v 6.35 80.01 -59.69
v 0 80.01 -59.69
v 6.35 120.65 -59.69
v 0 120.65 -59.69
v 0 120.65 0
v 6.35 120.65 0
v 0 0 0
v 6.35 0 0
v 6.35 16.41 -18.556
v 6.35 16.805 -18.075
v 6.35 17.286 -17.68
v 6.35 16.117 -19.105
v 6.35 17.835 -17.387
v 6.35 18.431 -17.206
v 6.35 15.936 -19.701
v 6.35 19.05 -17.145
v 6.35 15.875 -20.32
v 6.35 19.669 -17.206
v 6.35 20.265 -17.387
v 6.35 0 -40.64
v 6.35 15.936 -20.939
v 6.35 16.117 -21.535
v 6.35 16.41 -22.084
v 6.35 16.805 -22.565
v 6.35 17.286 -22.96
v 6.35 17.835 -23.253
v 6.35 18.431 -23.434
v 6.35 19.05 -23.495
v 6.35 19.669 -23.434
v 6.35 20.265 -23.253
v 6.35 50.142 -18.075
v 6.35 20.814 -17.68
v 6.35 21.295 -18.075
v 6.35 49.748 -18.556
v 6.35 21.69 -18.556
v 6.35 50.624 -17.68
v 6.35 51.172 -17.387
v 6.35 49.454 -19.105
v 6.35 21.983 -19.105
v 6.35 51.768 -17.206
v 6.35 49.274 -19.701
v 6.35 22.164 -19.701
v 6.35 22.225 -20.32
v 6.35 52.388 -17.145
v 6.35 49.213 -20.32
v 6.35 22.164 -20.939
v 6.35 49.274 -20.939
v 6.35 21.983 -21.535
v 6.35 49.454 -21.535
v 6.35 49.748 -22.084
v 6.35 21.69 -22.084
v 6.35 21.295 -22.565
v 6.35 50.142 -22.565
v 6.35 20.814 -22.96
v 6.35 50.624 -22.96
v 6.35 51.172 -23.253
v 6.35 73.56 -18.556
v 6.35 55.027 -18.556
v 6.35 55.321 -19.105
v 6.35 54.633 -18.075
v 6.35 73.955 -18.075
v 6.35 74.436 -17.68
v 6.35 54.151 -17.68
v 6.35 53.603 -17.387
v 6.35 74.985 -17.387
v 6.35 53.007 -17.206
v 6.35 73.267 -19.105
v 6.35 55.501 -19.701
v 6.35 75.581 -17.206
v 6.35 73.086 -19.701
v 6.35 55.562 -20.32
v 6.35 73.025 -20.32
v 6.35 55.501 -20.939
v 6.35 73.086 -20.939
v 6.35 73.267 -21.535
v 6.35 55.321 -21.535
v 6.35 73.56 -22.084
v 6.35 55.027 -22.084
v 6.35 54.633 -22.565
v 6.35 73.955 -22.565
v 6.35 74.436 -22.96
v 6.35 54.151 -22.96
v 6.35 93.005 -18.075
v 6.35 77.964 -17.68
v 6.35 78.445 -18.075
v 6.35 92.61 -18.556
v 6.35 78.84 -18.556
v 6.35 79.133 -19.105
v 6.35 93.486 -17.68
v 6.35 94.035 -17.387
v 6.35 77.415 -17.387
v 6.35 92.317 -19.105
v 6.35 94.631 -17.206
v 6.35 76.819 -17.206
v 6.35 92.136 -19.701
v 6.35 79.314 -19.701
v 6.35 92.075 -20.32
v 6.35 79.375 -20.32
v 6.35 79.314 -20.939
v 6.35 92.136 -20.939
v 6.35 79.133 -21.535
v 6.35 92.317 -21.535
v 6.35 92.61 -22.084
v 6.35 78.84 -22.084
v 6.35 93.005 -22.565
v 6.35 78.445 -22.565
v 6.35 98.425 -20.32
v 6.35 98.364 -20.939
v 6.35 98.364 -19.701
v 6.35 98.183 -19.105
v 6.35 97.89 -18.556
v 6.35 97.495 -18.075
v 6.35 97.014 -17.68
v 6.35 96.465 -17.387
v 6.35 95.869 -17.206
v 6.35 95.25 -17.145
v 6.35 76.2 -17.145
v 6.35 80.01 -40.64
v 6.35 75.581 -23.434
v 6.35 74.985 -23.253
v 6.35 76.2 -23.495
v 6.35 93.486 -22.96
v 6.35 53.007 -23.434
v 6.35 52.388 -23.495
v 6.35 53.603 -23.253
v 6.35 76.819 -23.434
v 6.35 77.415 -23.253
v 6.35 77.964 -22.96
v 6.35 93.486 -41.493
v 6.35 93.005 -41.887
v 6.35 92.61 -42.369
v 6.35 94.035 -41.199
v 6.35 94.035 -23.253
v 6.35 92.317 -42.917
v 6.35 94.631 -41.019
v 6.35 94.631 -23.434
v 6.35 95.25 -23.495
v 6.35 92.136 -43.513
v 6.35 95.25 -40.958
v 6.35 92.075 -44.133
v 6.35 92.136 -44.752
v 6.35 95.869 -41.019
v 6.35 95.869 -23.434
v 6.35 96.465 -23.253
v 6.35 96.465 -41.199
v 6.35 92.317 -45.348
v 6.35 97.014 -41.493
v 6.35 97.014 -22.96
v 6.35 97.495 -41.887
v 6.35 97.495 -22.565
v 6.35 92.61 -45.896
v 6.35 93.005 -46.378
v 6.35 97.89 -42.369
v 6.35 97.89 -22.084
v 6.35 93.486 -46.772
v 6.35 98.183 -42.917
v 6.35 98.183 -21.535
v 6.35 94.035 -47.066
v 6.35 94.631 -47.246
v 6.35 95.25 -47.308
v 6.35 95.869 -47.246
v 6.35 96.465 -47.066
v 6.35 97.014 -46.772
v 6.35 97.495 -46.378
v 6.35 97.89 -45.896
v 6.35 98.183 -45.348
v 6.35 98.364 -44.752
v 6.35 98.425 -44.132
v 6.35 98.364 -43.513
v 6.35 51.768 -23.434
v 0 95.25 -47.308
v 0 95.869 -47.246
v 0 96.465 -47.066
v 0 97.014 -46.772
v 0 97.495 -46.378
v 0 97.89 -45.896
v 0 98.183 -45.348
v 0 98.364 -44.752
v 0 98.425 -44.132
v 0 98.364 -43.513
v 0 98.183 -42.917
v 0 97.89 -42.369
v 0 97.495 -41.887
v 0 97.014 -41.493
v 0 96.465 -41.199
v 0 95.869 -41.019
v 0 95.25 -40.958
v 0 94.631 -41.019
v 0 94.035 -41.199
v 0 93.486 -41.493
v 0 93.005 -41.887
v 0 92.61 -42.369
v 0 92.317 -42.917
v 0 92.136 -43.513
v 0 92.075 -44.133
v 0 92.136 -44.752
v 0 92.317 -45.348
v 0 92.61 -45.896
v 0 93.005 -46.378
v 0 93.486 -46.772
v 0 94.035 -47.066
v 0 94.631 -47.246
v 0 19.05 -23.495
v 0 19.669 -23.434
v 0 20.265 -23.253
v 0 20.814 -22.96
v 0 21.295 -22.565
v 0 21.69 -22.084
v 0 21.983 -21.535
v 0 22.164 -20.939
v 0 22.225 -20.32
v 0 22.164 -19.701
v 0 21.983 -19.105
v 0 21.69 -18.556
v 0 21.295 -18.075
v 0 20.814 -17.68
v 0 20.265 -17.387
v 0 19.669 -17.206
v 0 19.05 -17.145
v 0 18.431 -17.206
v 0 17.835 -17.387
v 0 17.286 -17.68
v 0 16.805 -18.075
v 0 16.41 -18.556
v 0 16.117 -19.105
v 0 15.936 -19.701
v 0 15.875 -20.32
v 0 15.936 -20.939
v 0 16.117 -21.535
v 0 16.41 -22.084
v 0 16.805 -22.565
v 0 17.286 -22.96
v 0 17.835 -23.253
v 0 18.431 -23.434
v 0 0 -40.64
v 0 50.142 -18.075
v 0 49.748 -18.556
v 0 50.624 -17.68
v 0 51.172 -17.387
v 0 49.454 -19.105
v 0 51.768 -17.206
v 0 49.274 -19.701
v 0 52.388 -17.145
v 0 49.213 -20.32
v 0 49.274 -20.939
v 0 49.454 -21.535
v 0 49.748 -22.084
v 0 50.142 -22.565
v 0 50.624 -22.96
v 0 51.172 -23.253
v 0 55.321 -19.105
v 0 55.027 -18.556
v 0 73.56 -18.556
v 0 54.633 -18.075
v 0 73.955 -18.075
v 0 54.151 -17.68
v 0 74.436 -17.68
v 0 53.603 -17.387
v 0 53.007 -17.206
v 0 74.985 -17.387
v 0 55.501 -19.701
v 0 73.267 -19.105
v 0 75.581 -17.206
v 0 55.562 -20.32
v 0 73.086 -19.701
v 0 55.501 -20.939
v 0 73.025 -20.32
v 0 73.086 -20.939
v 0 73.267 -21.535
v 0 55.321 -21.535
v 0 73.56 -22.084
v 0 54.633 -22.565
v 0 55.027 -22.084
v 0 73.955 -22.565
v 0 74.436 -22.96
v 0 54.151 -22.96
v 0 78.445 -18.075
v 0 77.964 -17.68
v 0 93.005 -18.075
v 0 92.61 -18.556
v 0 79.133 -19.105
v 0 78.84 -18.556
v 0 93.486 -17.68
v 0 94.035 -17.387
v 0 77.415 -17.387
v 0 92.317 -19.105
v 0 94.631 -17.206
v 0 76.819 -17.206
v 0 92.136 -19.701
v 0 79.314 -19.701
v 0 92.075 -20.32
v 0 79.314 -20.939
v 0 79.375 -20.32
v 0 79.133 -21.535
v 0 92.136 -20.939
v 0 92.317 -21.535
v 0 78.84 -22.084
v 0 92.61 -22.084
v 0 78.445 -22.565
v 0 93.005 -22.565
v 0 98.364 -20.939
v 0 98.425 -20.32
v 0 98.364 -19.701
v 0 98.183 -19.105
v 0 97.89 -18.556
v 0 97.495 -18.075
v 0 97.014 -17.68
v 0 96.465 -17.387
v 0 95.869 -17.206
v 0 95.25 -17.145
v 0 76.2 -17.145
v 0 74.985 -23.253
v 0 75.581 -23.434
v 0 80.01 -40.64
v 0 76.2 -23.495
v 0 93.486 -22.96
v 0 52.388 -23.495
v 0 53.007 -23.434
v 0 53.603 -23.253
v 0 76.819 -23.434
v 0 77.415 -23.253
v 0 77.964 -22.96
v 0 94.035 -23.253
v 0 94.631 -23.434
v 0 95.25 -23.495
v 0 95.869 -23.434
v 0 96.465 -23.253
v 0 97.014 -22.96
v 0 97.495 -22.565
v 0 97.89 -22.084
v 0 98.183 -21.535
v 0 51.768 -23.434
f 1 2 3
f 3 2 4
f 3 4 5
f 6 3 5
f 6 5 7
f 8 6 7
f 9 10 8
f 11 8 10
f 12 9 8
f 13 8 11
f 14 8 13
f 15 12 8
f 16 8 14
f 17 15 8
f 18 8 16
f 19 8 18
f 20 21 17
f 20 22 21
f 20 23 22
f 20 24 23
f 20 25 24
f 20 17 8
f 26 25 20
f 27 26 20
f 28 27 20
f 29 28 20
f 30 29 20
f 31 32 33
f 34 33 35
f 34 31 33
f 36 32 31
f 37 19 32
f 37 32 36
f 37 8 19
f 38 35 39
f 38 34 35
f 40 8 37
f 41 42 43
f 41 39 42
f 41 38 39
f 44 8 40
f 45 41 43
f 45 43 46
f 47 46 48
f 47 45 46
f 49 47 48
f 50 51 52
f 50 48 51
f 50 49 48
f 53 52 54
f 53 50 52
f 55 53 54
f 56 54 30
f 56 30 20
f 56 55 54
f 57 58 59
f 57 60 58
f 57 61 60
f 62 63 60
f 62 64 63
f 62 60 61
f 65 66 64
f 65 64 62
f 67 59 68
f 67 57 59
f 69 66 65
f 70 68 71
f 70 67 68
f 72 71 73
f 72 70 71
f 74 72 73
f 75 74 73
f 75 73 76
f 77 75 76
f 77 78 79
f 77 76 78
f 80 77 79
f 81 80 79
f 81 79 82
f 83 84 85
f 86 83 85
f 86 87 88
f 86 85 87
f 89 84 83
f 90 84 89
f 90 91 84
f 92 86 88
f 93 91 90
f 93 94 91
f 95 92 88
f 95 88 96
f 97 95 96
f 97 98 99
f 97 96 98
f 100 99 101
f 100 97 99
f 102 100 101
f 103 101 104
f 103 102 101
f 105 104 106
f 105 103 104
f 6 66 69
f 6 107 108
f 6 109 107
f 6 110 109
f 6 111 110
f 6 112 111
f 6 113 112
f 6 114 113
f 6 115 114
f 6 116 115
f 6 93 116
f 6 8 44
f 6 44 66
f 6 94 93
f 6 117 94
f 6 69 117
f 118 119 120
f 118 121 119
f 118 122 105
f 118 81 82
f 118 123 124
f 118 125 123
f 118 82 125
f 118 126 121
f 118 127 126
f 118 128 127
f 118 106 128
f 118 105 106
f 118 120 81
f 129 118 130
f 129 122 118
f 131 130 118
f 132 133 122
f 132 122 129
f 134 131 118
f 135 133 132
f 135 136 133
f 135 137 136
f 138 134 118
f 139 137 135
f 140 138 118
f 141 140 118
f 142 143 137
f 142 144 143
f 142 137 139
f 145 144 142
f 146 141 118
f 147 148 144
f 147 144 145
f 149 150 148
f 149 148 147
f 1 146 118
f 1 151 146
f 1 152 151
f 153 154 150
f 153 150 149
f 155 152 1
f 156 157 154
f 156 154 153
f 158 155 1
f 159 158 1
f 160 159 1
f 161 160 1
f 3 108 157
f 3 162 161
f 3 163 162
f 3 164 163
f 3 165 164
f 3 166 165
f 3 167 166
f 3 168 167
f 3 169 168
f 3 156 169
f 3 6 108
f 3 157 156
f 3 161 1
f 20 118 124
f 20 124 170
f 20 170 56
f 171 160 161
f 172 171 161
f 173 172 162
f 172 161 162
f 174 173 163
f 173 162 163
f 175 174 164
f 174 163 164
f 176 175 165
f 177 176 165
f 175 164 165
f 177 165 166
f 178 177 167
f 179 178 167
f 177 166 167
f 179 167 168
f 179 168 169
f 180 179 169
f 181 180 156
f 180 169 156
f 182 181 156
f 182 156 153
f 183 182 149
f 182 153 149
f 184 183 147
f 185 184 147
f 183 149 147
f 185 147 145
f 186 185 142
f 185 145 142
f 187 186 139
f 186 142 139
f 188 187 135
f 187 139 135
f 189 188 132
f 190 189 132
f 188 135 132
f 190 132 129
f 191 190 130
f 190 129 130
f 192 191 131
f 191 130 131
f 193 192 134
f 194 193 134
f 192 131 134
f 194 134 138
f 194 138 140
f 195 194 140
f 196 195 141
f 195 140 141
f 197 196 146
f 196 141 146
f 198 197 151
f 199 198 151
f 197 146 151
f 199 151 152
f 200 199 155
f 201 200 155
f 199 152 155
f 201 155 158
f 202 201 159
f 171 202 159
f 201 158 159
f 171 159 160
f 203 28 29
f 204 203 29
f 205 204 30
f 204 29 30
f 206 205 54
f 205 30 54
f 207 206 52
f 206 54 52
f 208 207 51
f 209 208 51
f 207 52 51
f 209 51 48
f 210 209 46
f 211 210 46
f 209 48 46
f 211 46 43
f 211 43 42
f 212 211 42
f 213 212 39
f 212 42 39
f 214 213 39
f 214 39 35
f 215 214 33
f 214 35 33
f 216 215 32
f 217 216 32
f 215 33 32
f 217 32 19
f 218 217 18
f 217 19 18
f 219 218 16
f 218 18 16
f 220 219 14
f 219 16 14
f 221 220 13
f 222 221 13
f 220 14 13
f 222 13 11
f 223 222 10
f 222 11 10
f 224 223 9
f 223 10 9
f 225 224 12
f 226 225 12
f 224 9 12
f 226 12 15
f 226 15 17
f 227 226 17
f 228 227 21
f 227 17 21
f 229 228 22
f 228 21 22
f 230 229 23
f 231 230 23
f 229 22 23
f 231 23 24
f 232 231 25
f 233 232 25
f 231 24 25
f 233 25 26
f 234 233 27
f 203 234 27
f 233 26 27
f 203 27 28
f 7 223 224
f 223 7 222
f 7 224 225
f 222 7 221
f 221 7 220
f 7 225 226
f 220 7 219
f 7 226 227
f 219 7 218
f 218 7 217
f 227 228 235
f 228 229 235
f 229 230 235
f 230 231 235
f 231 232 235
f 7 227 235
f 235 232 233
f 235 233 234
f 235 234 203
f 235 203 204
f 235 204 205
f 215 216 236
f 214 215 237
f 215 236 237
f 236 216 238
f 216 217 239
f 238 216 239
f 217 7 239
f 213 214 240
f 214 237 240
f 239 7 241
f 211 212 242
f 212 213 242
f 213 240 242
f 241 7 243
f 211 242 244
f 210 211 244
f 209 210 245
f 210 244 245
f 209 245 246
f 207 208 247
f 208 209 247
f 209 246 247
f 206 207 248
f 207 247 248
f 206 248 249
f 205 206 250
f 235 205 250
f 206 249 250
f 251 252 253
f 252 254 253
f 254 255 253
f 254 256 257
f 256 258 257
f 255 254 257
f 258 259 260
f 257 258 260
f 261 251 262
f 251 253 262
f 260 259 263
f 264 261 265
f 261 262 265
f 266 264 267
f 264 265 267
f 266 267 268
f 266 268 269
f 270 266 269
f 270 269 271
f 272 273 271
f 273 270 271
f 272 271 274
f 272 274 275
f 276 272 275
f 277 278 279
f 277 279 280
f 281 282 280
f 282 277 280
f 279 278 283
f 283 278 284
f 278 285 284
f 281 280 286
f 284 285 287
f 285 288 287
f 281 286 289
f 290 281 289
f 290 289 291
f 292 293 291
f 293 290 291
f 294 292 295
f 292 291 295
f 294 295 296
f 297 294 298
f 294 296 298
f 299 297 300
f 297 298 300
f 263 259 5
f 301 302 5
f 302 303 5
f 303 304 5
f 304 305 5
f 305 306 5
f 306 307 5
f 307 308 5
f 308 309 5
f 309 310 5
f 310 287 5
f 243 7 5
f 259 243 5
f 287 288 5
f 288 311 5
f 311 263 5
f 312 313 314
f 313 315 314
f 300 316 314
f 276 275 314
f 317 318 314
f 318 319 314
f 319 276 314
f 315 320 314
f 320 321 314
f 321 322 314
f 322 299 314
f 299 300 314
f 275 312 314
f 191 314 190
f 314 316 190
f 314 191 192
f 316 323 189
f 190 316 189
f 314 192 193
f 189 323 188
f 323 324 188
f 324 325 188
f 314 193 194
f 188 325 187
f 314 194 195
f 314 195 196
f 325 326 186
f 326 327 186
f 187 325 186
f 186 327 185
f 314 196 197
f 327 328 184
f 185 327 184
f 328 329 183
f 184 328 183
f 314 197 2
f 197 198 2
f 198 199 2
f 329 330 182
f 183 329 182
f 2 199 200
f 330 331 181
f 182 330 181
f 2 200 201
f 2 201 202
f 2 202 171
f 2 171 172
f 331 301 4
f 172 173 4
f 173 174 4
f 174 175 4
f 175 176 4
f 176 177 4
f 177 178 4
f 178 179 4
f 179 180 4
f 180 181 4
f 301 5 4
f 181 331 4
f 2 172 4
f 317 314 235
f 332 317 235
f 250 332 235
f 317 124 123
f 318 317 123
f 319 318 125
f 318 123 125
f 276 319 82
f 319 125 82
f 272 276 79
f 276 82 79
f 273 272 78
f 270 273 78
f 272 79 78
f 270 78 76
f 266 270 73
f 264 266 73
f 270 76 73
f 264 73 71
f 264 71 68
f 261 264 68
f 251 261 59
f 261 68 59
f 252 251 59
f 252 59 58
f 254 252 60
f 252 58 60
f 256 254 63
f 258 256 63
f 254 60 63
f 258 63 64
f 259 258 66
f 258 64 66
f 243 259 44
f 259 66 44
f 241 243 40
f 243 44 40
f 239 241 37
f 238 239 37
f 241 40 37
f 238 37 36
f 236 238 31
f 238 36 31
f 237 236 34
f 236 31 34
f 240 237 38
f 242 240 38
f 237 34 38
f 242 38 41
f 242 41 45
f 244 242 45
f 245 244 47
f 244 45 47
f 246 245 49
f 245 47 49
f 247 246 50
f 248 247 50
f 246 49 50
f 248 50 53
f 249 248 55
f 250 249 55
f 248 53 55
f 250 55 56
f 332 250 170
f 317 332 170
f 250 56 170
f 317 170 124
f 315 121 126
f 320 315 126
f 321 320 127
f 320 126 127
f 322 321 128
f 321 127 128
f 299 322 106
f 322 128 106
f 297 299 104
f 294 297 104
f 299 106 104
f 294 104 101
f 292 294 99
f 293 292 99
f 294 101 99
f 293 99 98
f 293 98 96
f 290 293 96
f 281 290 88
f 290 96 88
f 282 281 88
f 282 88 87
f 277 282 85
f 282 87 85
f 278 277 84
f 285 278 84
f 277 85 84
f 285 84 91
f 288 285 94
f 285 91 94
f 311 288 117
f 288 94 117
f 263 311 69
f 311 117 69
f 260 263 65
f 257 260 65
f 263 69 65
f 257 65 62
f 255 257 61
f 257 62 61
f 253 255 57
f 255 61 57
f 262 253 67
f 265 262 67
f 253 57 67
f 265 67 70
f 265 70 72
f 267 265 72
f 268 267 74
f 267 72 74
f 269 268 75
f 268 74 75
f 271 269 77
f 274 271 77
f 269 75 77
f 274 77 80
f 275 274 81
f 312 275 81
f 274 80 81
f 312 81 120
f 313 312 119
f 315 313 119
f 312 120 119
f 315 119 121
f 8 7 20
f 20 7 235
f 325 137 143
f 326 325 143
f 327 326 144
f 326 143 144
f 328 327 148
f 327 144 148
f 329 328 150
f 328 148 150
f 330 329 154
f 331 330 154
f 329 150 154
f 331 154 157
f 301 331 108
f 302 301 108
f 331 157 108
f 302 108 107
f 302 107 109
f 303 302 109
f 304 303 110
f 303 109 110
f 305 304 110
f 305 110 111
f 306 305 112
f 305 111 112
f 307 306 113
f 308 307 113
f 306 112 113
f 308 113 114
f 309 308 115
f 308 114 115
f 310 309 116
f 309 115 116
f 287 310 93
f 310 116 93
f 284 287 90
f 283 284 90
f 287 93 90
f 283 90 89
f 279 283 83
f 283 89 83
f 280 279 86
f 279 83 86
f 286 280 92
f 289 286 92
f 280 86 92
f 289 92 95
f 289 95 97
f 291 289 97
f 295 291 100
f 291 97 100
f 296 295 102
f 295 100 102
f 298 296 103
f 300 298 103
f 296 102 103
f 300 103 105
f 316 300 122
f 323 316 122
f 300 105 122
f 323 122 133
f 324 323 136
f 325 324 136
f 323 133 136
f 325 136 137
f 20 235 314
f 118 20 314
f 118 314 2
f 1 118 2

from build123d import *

# Parameters (mm, degrees)
BOSS_EXTRUDE1_DEPTH = 6.35
SKETCH3_R           = 3.175
CUT_EXTRUDE1_DEPTH  = 6.35


with BuildPart() as part:
    # Sketch1 → Boss-Extrude1 (new body)
    with BuildSketch(Plane(origin=(0, 0, 0), x_dir=(0, 0, -1), z_dir=(1, 0, 0))):
        Polygon((0, 0), (40.64, 0), (40.64, 80.01), (59.69, 80.01), (59.69, 120.65), (40.64, 120.65), (0, 120.65), align=None)
    extrude(amount=BOSS_EXTRUDE1_DEPTH)

    # Sketch3 → Cut-Extrude1 (cut)
    with BuildSketch(Plane(origin=(6.35, 0, 0), x_dir=(0, 0, -1), z_dir=(1, 0, 0))):
        with Locations((20.32, 19.05)):
            Circle(SKETCH3_R)
        with Locations((20.32, 52.3875)):
            Circle(SKETCH3_R)
        with Locations((20.32, 76.2)):
            Circle(SKETCH3_R)
        with Locations((20.32, 95.25)):
            Circle(SKETCH3_R)
        with Locations((44.1325, 95.25)):
            Circle(SKETCH3_R)
    extrude(amount=-CUT_EXTRUDE1_DEPTH, mode=Mode.SUBTRACT)


solid = part.part
